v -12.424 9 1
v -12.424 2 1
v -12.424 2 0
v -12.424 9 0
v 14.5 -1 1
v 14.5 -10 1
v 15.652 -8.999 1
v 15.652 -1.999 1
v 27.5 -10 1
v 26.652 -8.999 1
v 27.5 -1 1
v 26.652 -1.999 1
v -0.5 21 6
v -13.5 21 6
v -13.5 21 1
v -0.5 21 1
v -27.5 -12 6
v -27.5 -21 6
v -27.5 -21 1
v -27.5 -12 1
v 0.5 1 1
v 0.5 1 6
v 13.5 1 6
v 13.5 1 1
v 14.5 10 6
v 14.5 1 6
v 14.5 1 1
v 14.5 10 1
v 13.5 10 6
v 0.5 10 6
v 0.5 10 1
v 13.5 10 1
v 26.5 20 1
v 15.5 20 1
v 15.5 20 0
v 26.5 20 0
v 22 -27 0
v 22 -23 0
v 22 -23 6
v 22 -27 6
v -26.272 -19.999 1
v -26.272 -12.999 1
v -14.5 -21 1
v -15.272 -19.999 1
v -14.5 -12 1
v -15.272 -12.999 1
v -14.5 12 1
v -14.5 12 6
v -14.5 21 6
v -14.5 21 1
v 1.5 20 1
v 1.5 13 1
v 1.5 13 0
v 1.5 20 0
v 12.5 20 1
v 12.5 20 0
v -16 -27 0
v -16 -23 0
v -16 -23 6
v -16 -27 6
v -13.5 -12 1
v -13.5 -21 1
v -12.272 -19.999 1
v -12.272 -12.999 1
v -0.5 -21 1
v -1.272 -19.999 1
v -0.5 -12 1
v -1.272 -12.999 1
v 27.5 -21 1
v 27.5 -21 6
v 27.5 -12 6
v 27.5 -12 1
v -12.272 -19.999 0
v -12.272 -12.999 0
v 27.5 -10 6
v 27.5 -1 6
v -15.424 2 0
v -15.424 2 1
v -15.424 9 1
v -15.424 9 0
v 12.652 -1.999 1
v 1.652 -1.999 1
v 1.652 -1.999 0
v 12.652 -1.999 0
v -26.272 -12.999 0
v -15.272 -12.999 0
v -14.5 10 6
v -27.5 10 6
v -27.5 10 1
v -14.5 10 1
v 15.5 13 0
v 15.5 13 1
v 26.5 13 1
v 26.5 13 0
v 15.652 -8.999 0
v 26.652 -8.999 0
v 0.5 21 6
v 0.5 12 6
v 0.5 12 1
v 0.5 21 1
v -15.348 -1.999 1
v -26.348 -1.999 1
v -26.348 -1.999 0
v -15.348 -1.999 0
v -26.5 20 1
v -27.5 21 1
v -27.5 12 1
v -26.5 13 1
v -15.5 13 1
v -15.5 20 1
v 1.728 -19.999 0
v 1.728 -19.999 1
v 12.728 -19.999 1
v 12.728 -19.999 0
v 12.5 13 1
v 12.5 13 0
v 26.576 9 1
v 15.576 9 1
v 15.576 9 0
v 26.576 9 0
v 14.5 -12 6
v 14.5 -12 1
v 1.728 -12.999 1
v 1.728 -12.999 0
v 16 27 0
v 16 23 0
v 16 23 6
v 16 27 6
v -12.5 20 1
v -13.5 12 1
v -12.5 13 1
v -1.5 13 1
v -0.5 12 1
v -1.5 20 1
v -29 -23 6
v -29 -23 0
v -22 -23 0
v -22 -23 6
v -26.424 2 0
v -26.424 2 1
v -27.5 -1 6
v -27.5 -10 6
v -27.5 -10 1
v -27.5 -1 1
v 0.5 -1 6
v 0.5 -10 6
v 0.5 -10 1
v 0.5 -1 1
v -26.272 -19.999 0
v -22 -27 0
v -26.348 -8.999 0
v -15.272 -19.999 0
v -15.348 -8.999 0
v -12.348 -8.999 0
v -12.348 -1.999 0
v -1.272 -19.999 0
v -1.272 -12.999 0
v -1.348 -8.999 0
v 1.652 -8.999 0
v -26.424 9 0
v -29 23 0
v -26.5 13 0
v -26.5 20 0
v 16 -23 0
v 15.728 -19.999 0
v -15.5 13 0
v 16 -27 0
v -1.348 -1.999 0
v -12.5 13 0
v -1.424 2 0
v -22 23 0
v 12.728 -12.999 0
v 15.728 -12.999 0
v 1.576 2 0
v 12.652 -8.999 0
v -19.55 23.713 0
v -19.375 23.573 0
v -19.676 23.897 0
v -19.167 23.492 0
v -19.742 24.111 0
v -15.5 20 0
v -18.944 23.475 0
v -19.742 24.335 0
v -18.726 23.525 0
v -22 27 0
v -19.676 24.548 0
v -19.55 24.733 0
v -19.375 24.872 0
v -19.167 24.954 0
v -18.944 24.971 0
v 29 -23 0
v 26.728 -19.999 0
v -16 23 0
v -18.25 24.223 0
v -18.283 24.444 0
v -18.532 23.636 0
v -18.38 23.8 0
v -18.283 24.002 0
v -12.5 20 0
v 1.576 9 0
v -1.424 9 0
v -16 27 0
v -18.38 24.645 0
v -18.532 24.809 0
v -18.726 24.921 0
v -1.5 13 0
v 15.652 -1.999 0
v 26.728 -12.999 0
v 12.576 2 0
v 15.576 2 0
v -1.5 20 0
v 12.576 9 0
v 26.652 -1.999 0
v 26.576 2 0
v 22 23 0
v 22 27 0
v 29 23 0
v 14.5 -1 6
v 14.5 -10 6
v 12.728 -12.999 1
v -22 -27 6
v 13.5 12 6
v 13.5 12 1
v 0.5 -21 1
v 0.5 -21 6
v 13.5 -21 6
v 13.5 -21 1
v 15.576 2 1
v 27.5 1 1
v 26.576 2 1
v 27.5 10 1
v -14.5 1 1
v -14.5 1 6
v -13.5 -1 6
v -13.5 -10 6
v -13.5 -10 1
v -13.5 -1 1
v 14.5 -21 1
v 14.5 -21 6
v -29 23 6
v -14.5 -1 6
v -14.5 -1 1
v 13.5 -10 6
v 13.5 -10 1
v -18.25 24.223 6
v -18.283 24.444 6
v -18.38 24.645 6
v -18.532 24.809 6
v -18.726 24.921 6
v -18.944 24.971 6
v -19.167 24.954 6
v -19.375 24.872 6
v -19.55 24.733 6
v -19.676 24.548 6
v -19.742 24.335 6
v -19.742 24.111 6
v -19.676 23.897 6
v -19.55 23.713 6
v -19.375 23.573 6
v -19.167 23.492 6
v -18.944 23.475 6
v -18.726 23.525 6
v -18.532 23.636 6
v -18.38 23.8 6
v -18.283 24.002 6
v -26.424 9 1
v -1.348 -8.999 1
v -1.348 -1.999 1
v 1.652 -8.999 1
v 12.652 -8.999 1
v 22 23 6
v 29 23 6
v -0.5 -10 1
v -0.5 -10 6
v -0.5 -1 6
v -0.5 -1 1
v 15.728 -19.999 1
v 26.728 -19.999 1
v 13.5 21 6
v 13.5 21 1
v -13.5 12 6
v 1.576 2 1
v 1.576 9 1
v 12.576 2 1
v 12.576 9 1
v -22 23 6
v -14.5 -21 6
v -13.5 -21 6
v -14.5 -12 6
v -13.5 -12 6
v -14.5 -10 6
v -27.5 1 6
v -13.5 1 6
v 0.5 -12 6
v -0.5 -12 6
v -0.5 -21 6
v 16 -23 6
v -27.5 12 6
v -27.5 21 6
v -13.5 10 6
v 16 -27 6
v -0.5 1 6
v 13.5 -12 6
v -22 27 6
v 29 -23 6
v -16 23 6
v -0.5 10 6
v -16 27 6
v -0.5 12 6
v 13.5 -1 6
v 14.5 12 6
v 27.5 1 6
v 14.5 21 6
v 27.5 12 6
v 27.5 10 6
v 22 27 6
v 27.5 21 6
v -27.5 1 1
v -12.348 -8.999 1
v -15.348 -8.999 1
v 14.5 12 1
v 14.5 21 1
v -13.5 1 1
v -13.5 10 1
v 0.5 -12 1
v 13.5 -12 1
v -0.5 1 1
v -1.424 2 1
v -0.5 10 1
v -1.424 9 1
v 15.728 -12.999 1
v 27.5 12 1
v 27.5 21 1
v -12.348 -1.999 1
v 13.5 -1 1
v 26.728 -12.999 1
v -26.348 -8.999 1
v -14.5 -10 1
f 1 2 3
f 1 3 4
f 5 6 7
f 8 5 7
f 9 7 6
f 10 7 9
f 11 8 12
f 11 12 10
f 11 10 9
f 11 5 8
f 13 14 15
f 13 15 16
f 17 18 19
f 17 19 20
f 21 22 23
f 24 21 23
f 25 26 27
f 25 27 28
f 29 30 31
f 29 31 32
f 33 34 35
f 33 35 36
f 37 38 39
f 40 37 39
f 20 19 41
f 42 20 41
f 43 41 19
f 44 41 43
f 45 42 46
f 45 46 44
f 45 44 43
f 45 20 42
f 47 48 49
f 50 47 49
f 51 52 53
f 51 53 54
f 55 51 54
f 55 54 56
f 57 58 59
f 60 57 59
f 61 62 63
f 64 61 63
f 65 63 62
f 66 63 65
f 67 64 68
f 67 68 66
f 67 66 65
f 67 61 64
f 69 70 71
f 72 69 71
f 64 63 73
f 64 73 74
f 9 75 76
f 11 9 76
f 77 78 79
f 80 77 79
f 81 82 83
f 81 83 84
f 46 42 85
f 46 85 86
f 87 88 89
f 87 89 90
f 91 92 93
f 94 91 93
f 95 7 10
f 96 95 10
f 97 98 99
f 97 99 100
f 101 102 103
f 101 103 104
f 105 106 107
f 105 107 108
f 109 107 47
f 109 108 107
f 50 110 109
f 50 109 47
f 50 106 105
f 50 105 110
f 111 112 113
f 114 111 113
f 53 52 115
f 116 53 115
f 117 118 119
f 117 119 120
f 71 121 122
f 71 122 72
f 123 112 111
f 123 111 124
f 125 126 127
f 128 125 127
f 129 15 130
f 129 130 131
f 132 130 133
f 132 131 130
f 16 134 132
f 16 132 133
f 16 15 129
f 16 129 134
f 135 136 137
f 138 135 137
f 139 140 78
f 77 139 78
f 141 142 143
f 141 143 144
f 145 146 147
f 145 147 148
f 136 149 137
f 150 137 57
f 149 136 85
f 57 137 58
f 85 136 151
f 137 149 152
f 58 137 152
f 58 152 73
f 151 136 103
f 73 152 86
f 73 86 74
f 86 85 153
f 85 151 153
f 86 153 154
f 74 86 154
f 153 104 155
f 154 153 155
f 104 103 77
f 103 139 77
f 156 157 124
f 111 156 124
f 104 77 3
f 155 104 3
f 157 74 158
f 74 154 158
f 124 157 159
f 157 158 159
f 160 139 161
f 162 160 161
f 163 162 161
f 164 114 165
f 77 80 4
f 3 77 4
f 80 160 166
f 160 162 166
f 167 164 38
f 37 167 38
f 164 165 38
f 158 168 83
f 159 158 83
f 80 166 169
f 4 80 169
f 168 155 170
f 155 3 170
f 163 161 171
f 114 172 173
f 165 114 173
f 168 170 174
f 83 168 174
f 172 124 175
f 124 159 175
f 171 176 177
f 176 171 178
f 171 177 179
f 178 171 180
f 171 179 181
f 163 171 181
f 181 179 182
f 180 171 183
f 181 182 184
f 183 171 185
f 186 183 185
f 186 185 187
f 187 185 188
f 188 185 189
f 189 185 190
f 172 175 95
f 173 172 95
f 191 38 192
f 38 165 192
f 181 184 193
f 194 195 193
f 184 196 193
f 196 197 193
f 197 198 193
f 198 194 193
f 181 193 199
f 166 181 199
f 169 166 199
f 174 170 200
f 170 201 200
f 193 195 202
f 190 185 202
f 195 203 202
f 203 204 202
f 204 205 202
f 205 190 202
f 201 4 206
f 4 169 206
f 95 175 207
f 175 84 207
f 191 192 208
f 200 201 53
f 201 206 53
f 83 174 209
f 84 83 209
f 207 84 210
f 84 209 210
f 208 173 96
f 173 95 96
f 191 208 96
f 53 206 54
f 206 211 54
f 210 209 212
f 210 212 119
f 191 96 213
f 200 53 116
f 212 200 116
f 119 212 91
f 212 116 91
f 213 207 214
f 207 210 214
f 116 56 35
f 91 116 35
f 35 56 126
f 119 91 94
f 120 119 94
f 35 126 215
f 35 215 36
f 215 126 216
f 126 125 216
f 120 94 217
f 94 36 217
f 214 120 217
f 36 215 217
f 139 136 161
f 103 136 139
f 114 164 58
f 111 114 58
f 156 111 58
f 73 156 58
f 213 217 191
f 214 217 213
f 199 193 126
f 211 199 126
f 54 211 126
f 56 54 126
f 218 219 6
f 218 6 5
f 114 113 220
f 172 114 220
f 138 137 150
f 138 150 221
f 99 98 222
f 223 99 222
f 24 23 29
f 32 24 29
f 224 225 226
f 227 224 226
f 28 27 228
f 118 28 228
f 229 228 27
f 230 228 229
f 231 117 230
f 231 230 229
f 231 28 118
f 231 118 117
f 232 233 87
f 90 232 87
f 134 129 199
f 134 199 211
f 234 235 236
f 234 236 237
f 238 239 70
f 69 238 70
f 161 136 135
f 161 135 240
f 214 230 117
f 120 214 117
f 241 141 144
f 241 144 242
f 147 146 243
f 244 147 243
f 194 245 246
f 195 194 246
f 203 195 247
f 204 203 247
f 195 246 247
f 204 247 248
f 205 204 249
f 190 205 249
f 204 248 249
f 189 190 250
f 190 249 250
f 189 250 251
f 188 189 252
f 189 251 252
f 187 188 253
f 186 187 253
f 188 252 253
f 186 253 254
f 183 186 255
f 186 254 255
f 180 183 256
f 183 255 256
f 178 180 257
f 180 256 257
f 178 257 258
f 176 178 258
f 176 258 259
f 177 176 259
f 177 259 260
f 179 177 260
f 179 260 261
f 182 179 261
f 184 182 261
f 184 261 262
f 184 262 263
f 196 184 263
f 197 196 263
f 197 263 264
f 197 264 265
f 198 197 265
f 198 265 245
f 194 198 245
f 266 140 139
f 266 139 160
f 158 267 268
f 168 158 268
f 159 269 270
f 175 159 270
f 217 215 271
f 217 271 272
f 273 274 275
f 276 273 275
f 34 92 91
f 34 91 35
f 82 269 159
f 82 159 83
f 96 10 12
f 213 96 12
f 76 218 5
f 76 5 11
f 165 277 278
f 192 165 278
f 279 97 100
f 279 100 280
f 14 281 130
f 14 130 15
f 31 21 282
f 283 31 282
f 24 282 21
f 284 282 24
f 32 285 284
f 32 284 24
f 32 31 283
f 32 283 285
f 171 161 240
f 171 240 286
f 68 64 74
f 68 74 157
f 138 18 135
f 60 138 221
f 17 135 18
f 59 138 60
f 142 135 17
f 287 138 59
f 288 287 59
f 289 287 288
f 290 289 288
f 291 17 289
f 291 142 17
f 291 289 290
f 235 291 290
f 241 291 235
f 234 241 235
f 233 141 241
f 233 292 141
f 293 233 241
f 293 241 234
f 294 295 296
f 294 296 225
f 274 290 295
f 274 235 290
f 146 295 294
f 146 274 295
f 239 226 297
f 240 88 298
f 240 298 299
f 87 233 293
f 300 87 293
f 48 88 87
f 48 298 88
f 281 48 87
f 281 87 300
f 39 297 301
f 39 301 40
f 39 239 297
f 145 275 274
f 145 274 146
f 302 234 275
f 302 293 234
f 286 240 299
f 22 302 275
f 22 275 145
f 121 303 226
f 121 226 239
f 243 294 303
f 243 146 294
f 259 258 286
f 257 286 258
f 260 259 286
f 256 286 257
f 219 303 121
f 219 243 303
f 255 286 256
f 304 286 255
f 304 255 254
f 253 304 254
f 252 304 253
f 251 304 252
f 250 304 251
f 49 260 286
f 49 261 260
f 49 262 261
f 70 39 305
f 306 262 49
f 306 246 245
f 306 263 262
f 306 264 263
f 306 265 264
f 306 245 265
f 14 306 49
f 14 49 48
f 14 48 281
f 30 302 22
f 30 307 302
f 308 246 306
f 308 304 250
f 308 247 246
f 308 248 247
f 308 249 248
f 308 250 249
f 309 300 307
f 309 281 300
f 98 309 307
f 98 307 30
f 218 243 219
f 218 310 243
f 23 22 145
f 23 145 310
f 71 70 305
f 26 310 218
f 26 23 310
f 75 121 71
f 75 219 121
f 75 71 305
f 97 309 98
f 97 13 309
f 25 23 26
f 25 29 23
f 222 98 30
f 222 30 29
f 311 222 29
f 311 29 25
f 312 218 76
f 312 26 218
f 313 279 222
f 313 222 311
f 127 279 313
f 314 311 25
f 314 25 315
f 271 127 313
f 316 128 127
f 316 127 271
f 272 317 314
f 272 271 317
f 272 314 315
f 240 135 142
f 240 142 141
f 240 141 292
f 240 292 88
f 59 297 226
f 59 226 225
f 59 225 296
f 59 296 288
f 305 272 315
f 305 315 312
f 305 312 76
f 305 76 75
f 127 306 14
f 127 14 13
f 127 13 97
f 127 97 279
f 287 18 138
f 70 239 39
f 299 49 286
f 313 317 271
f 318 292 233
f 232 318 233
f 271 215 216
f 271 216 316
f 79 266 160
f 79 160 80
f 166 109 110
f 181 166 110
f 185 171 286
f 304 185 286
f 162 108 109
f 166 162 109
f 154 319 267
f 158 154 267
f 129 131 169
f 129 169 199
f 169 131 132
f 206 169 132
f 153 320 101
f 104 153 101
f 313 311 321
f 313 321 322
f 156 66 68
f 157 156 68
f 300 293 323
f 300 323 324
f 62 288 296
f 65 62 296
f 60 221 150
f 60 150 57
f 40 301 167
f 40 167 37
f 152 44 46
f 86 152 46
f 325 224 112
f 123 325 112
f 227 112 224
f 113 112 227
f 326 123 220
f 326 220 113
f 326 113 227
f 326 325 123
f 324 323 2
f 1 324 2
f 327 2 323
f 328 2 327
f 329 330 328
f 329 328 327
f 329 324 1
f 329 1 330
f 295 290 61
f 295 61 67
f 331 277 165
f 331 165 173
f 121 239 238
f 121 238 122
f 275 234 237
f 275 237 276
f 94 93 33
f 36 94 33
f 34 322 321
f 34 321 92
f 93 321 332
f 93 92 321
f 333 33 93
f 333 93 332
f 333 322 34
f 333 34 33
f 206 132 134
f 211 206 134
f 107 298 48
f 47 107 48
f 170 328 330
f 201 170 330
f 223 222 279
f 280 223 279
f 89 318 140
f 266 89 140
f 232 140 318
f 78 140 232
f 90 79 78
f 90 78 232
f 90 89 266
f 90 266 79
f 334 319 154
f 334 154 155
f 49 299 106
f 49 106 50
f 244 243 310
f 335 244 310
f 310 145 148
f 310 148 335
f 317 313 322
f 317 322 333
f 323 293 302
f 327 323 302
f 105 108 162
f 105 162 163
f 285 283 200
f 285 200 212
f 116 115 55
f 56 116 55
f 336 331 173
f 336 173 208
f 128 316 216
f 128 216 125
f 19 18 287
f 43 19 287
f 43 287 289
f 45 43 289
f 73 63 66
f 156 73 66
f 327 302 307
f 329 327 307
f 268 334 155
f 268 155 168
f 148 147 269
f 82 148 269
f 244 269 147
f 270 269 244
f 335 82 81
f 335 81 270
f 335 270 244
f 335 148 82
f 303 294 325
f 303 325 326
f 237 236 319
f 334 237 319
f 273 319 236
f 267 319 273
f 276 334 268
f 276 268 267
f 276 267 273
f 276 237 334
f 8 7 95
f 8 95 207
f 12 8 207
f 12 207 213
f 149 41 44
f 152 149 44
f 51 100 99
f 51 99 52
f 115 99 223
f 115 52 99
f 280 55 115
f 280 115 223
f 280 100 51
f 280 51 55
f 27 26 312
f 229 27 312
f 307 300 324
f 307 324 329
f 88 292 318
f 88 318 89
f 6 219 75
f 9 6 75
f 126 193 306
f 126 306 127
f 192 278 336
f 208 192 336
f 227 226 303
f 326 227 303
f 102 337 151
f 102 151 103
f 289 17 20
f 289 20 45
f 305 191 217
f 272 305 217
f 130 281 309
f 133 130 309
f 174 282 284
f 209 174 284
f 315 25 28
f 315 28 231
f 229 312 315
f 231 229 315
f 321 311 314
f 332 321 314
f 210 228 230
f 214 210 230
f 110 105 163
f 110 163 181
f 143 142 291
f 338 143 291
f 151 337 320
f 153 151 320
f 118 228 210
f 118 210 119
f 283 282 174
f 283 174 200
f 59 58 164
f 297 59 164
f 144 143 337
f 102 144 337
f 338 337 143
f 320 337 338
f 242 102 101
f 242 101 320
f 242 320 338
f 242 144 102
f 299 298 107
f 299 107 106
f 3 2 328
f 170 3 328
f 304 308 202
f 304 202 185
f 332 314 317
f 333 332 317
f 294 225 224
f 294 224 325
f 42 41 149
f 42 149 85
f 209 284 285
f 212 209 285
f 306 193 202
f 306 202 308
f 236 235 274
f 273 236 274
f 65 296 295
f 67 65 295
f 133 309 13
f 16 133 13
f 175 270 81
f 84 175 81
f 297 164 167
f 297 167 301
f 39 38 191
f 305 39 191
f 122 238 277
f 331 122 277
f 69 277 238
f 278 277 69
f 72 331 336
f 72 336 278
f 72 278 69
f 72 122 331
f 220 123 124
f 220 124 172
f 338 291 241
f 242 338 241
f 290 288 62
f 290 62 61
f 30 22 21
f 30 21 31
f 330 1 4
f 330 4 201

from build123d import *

# Parameters (mm, degrees)
F0_W      = 58
F0_H      = 46
F1_DEPTH  = 6
F2_W      = 11
F2_H      = 7
F3_DEPTH  = 6.001
F4_W      = 13
F4_H      = 9
F4_W_2    = 11
F4_H_2    = 7
F5_DEPTH  = 5
F6_W      = 6
F6_H      = 6
F7_DEPTH  = 4
F8_W      = 6
F8_H      = 6
F9_DEPTH  = 4
F10_R     = 0.75
F11_DEPTH = 6.001


with BuildPart() as f1:
    # F0 (on Top) → F1 (new body)
    with BuildSketch(Plane.XY):
        Rectangle(F0_W, F0_H)
    extrude(amount=F1_DEPTH)

    # F2 (on face) → F3 (cut, through all)
    with BuildSketch(Plane.XY.offset(6)):
        with Locations((-21, 16.5)):
            Rectangle(F2_W, F2_H)
        with Locations((-7, 16.5)):
            Rectangle(F2_W, F2_H)
        with Locations((7, 16.5)):
            Rectangle(F2_W, F2_H)
        with Locations((21, 16.5)):
            Rectangle(F2_W, F2_H)
        with Locations((-20.923837, 5.500264)):
            Rectangle(F2_W, F2_H)
        with Locations((-6.923837, 5.500264)):
            Rectangle(F2_W, F2_H)
        with Locations((7.076163, 5.500264)):
            Rectangle(F2_W, F2_H)
        with Locations((21.076163, 5.500264)):
            Rectangle(F2_W, F2_H)
        with Locations((-20.847673, -5.499473)):
            Rectangle(F2_W, F2_H)
        with Locations((-6.847673, -5.499473)):
            Rectangle(F2_W, F2_H)
        with Locations((7.152327, -5.499473)):
            Rectangle(F2_W, F2_H)
        with Locations((21.152327, -5.499473)):
            Rectangle(F2_W, F2_H)
        with Locations((-20.77151, -16.499209)):
            Rectangle(F2_W, F2_H)
        with Locations((-6.77151, -16.499209)):
            Rectangle(F2_W, F2_H)
        with Locations((7.22849, -16.499209)):
            Rectangle(F2_W, F2_H)
        with Locations((21.22849, -16.499209)):
            Rectangle(F2_W, F2_H)
    extrude(amount=-F3_DEPTH, mode=Mode.SUBTRACT)

    # F4 (on face) → F5 (cut)
    with BuildSketch(Plane.XY.offset(6)):
        with Locations((-21, 16.5)):
            Rectangle(F4_W, F4_H)
        with Locations((-21, 16.5)):
            Rectangle(F4_W_2, F4_H_2, mode=Mode.SUBTRACT)
        with Locations((-7, 16.5)):
            Rectangle(F4_W, F4_H)
        with Locations((-7, 16.5)):
            Rectangle(F4_W_2, F4_H_2, mode=Mode.SUBTRACT)
        with Locations((7, 16.5)):
            Rectangle(F4_W, F4_H)
        with Locations((7, 16.5)):
            Rectangle(F4_W_2, F4_H_2, mode=Mode.SUBTRACT)
        with Locations((21, 16.5)):
            Rectangle(F4_W, F4_H)
        with Locations((21, 16.5)):
            Rectangle(F4_W_2, F4_H_2, mode=Mode.SUBTRACT)
        with Locations((-21, 5.5)):
            Rectangle(F4_W, F4_H)
        with Locations((-20.923837, 5.500264)):
            Rectangle(F4_W_2, F4_H_2, mode=Mode.SUBTRACT)
        with Locations((7, 5.5)):
            Rectangle(F4_W, F4_H)
        with Locations((7.076163, 5.500264)):
            Rectangle(F4_W_2, F4_H_2, mode=Mode.SUBTRACT)
        with Locations((-7, 5.5)):
            Rectangle(F4_W, F4_H)
        with Locations((-6.923837, 5.500264)):
            Rectangle(F4_W_2, F4_H_2, mode=Mode.SUBTRACT)
        with Locations((21, 5.5)):
            Rectangle(F4_W, F4_H)
        with Locations((21.076163, 5.500264)):
            Rectangle(F4_W_2, F4_H_2, mode=Mode.SUBTRACT)
        with Locations((-21, -5.5)):
            Rectangle(F4_W, F4_H)
        with Locations((-20.847673, -5.499473)):
            Rectangle(F4_W_2, F4_H_2, mode=Mode.SUBTRACT)
        with Locations((-7, -5.5)):
            Rectangle(F4_W, F4_H)
        with Locations((-6.847673, -5.499473)):
            Rectangle(F4_W_2, F4_H_2, mode=Mode.SUBTRACT)
        with Locations((7, -5.5)):
            Rectangle(F4_W, F4_H)
        with Locations((7.152327, -5.499473)):
            Rectangle(F4_W_2, F4_H_2, mode=Mode.SUBTRACT)
        with Locations((21, -5.5)):
            Rectangle(F4_W, F4_H)
        with Locations((21.152327, -5.499473)):
            Rectangle(F4_W_2, F4_H_2, mode=Mode.SUBTRACT)
        with Locations((-21, -16.5)):
            Rectangle(F4_W, F4_H)
        with Locations((-20.77151, -16.499209)):
            Rectangle(F4_W_2, F4_H_2, mode=Mode.SUBTRACT)
        with Locations((-7, -16.5)):
            Rectangle(F4_W, F4_H)
        with Locations((-6.77151, -16.499209)):
            Rectangle(F4_W_2, F4_H_2, mode=Mode.SUBTRACT)
        with Locations((7, -16.5)):
            Rectangle(F4_W, F4_H)
        with Locations((7.22849, -16.499209)):
            Rectangle(F4_W_2, F4_H_2, mode=Mode.SUBTRACT)
        with Locations((21, -16.5)):
            Rectangle(F4_W, F4_H)
        with Locations((21.22849, -16.499209)):
            Rectangle(F4_W_2, F4_H_2, mode=Mode.SUBTRACT)
    extrude(amount=-F5_DEPTH, mode=Mode.SUBTRACT)

    # F6 (on face) → F7 (join)
    with BuildSketch(Plane.XZ.offset(23)):
        with Locations((19, 3)):
            Rectangle(F6_W, F6_H)
        with Locations((-19, 3)):
            Rectangle(F6_W, F6_H)
    extrude(amount=F7_DEPTH)

    # F8 (on face) → F9 (join)
    with BuildSketch(Plane(origin=(0, 23, 0), x_dir=(-1, 0, 0), z_dir=(0, 1, 0))):
        with Locations((19, 3)):
            Rectangle(F8_W, F8_H)
        with Locations((-19, 3)):
            Rectangle(F8_W, F8_H)
    extrude(amount=F9_DEPTH)

    # F10 (on face) → F11 (cut, through all)
    with BuildSketch(Plane.XY.offset(6)):
        with Locations((-19, 24.222791)):
            Circle(F10_R)
    extrude(amount=-F11_DEPTH, mode=Mode.SUBTRACT)


solid = f1.part
